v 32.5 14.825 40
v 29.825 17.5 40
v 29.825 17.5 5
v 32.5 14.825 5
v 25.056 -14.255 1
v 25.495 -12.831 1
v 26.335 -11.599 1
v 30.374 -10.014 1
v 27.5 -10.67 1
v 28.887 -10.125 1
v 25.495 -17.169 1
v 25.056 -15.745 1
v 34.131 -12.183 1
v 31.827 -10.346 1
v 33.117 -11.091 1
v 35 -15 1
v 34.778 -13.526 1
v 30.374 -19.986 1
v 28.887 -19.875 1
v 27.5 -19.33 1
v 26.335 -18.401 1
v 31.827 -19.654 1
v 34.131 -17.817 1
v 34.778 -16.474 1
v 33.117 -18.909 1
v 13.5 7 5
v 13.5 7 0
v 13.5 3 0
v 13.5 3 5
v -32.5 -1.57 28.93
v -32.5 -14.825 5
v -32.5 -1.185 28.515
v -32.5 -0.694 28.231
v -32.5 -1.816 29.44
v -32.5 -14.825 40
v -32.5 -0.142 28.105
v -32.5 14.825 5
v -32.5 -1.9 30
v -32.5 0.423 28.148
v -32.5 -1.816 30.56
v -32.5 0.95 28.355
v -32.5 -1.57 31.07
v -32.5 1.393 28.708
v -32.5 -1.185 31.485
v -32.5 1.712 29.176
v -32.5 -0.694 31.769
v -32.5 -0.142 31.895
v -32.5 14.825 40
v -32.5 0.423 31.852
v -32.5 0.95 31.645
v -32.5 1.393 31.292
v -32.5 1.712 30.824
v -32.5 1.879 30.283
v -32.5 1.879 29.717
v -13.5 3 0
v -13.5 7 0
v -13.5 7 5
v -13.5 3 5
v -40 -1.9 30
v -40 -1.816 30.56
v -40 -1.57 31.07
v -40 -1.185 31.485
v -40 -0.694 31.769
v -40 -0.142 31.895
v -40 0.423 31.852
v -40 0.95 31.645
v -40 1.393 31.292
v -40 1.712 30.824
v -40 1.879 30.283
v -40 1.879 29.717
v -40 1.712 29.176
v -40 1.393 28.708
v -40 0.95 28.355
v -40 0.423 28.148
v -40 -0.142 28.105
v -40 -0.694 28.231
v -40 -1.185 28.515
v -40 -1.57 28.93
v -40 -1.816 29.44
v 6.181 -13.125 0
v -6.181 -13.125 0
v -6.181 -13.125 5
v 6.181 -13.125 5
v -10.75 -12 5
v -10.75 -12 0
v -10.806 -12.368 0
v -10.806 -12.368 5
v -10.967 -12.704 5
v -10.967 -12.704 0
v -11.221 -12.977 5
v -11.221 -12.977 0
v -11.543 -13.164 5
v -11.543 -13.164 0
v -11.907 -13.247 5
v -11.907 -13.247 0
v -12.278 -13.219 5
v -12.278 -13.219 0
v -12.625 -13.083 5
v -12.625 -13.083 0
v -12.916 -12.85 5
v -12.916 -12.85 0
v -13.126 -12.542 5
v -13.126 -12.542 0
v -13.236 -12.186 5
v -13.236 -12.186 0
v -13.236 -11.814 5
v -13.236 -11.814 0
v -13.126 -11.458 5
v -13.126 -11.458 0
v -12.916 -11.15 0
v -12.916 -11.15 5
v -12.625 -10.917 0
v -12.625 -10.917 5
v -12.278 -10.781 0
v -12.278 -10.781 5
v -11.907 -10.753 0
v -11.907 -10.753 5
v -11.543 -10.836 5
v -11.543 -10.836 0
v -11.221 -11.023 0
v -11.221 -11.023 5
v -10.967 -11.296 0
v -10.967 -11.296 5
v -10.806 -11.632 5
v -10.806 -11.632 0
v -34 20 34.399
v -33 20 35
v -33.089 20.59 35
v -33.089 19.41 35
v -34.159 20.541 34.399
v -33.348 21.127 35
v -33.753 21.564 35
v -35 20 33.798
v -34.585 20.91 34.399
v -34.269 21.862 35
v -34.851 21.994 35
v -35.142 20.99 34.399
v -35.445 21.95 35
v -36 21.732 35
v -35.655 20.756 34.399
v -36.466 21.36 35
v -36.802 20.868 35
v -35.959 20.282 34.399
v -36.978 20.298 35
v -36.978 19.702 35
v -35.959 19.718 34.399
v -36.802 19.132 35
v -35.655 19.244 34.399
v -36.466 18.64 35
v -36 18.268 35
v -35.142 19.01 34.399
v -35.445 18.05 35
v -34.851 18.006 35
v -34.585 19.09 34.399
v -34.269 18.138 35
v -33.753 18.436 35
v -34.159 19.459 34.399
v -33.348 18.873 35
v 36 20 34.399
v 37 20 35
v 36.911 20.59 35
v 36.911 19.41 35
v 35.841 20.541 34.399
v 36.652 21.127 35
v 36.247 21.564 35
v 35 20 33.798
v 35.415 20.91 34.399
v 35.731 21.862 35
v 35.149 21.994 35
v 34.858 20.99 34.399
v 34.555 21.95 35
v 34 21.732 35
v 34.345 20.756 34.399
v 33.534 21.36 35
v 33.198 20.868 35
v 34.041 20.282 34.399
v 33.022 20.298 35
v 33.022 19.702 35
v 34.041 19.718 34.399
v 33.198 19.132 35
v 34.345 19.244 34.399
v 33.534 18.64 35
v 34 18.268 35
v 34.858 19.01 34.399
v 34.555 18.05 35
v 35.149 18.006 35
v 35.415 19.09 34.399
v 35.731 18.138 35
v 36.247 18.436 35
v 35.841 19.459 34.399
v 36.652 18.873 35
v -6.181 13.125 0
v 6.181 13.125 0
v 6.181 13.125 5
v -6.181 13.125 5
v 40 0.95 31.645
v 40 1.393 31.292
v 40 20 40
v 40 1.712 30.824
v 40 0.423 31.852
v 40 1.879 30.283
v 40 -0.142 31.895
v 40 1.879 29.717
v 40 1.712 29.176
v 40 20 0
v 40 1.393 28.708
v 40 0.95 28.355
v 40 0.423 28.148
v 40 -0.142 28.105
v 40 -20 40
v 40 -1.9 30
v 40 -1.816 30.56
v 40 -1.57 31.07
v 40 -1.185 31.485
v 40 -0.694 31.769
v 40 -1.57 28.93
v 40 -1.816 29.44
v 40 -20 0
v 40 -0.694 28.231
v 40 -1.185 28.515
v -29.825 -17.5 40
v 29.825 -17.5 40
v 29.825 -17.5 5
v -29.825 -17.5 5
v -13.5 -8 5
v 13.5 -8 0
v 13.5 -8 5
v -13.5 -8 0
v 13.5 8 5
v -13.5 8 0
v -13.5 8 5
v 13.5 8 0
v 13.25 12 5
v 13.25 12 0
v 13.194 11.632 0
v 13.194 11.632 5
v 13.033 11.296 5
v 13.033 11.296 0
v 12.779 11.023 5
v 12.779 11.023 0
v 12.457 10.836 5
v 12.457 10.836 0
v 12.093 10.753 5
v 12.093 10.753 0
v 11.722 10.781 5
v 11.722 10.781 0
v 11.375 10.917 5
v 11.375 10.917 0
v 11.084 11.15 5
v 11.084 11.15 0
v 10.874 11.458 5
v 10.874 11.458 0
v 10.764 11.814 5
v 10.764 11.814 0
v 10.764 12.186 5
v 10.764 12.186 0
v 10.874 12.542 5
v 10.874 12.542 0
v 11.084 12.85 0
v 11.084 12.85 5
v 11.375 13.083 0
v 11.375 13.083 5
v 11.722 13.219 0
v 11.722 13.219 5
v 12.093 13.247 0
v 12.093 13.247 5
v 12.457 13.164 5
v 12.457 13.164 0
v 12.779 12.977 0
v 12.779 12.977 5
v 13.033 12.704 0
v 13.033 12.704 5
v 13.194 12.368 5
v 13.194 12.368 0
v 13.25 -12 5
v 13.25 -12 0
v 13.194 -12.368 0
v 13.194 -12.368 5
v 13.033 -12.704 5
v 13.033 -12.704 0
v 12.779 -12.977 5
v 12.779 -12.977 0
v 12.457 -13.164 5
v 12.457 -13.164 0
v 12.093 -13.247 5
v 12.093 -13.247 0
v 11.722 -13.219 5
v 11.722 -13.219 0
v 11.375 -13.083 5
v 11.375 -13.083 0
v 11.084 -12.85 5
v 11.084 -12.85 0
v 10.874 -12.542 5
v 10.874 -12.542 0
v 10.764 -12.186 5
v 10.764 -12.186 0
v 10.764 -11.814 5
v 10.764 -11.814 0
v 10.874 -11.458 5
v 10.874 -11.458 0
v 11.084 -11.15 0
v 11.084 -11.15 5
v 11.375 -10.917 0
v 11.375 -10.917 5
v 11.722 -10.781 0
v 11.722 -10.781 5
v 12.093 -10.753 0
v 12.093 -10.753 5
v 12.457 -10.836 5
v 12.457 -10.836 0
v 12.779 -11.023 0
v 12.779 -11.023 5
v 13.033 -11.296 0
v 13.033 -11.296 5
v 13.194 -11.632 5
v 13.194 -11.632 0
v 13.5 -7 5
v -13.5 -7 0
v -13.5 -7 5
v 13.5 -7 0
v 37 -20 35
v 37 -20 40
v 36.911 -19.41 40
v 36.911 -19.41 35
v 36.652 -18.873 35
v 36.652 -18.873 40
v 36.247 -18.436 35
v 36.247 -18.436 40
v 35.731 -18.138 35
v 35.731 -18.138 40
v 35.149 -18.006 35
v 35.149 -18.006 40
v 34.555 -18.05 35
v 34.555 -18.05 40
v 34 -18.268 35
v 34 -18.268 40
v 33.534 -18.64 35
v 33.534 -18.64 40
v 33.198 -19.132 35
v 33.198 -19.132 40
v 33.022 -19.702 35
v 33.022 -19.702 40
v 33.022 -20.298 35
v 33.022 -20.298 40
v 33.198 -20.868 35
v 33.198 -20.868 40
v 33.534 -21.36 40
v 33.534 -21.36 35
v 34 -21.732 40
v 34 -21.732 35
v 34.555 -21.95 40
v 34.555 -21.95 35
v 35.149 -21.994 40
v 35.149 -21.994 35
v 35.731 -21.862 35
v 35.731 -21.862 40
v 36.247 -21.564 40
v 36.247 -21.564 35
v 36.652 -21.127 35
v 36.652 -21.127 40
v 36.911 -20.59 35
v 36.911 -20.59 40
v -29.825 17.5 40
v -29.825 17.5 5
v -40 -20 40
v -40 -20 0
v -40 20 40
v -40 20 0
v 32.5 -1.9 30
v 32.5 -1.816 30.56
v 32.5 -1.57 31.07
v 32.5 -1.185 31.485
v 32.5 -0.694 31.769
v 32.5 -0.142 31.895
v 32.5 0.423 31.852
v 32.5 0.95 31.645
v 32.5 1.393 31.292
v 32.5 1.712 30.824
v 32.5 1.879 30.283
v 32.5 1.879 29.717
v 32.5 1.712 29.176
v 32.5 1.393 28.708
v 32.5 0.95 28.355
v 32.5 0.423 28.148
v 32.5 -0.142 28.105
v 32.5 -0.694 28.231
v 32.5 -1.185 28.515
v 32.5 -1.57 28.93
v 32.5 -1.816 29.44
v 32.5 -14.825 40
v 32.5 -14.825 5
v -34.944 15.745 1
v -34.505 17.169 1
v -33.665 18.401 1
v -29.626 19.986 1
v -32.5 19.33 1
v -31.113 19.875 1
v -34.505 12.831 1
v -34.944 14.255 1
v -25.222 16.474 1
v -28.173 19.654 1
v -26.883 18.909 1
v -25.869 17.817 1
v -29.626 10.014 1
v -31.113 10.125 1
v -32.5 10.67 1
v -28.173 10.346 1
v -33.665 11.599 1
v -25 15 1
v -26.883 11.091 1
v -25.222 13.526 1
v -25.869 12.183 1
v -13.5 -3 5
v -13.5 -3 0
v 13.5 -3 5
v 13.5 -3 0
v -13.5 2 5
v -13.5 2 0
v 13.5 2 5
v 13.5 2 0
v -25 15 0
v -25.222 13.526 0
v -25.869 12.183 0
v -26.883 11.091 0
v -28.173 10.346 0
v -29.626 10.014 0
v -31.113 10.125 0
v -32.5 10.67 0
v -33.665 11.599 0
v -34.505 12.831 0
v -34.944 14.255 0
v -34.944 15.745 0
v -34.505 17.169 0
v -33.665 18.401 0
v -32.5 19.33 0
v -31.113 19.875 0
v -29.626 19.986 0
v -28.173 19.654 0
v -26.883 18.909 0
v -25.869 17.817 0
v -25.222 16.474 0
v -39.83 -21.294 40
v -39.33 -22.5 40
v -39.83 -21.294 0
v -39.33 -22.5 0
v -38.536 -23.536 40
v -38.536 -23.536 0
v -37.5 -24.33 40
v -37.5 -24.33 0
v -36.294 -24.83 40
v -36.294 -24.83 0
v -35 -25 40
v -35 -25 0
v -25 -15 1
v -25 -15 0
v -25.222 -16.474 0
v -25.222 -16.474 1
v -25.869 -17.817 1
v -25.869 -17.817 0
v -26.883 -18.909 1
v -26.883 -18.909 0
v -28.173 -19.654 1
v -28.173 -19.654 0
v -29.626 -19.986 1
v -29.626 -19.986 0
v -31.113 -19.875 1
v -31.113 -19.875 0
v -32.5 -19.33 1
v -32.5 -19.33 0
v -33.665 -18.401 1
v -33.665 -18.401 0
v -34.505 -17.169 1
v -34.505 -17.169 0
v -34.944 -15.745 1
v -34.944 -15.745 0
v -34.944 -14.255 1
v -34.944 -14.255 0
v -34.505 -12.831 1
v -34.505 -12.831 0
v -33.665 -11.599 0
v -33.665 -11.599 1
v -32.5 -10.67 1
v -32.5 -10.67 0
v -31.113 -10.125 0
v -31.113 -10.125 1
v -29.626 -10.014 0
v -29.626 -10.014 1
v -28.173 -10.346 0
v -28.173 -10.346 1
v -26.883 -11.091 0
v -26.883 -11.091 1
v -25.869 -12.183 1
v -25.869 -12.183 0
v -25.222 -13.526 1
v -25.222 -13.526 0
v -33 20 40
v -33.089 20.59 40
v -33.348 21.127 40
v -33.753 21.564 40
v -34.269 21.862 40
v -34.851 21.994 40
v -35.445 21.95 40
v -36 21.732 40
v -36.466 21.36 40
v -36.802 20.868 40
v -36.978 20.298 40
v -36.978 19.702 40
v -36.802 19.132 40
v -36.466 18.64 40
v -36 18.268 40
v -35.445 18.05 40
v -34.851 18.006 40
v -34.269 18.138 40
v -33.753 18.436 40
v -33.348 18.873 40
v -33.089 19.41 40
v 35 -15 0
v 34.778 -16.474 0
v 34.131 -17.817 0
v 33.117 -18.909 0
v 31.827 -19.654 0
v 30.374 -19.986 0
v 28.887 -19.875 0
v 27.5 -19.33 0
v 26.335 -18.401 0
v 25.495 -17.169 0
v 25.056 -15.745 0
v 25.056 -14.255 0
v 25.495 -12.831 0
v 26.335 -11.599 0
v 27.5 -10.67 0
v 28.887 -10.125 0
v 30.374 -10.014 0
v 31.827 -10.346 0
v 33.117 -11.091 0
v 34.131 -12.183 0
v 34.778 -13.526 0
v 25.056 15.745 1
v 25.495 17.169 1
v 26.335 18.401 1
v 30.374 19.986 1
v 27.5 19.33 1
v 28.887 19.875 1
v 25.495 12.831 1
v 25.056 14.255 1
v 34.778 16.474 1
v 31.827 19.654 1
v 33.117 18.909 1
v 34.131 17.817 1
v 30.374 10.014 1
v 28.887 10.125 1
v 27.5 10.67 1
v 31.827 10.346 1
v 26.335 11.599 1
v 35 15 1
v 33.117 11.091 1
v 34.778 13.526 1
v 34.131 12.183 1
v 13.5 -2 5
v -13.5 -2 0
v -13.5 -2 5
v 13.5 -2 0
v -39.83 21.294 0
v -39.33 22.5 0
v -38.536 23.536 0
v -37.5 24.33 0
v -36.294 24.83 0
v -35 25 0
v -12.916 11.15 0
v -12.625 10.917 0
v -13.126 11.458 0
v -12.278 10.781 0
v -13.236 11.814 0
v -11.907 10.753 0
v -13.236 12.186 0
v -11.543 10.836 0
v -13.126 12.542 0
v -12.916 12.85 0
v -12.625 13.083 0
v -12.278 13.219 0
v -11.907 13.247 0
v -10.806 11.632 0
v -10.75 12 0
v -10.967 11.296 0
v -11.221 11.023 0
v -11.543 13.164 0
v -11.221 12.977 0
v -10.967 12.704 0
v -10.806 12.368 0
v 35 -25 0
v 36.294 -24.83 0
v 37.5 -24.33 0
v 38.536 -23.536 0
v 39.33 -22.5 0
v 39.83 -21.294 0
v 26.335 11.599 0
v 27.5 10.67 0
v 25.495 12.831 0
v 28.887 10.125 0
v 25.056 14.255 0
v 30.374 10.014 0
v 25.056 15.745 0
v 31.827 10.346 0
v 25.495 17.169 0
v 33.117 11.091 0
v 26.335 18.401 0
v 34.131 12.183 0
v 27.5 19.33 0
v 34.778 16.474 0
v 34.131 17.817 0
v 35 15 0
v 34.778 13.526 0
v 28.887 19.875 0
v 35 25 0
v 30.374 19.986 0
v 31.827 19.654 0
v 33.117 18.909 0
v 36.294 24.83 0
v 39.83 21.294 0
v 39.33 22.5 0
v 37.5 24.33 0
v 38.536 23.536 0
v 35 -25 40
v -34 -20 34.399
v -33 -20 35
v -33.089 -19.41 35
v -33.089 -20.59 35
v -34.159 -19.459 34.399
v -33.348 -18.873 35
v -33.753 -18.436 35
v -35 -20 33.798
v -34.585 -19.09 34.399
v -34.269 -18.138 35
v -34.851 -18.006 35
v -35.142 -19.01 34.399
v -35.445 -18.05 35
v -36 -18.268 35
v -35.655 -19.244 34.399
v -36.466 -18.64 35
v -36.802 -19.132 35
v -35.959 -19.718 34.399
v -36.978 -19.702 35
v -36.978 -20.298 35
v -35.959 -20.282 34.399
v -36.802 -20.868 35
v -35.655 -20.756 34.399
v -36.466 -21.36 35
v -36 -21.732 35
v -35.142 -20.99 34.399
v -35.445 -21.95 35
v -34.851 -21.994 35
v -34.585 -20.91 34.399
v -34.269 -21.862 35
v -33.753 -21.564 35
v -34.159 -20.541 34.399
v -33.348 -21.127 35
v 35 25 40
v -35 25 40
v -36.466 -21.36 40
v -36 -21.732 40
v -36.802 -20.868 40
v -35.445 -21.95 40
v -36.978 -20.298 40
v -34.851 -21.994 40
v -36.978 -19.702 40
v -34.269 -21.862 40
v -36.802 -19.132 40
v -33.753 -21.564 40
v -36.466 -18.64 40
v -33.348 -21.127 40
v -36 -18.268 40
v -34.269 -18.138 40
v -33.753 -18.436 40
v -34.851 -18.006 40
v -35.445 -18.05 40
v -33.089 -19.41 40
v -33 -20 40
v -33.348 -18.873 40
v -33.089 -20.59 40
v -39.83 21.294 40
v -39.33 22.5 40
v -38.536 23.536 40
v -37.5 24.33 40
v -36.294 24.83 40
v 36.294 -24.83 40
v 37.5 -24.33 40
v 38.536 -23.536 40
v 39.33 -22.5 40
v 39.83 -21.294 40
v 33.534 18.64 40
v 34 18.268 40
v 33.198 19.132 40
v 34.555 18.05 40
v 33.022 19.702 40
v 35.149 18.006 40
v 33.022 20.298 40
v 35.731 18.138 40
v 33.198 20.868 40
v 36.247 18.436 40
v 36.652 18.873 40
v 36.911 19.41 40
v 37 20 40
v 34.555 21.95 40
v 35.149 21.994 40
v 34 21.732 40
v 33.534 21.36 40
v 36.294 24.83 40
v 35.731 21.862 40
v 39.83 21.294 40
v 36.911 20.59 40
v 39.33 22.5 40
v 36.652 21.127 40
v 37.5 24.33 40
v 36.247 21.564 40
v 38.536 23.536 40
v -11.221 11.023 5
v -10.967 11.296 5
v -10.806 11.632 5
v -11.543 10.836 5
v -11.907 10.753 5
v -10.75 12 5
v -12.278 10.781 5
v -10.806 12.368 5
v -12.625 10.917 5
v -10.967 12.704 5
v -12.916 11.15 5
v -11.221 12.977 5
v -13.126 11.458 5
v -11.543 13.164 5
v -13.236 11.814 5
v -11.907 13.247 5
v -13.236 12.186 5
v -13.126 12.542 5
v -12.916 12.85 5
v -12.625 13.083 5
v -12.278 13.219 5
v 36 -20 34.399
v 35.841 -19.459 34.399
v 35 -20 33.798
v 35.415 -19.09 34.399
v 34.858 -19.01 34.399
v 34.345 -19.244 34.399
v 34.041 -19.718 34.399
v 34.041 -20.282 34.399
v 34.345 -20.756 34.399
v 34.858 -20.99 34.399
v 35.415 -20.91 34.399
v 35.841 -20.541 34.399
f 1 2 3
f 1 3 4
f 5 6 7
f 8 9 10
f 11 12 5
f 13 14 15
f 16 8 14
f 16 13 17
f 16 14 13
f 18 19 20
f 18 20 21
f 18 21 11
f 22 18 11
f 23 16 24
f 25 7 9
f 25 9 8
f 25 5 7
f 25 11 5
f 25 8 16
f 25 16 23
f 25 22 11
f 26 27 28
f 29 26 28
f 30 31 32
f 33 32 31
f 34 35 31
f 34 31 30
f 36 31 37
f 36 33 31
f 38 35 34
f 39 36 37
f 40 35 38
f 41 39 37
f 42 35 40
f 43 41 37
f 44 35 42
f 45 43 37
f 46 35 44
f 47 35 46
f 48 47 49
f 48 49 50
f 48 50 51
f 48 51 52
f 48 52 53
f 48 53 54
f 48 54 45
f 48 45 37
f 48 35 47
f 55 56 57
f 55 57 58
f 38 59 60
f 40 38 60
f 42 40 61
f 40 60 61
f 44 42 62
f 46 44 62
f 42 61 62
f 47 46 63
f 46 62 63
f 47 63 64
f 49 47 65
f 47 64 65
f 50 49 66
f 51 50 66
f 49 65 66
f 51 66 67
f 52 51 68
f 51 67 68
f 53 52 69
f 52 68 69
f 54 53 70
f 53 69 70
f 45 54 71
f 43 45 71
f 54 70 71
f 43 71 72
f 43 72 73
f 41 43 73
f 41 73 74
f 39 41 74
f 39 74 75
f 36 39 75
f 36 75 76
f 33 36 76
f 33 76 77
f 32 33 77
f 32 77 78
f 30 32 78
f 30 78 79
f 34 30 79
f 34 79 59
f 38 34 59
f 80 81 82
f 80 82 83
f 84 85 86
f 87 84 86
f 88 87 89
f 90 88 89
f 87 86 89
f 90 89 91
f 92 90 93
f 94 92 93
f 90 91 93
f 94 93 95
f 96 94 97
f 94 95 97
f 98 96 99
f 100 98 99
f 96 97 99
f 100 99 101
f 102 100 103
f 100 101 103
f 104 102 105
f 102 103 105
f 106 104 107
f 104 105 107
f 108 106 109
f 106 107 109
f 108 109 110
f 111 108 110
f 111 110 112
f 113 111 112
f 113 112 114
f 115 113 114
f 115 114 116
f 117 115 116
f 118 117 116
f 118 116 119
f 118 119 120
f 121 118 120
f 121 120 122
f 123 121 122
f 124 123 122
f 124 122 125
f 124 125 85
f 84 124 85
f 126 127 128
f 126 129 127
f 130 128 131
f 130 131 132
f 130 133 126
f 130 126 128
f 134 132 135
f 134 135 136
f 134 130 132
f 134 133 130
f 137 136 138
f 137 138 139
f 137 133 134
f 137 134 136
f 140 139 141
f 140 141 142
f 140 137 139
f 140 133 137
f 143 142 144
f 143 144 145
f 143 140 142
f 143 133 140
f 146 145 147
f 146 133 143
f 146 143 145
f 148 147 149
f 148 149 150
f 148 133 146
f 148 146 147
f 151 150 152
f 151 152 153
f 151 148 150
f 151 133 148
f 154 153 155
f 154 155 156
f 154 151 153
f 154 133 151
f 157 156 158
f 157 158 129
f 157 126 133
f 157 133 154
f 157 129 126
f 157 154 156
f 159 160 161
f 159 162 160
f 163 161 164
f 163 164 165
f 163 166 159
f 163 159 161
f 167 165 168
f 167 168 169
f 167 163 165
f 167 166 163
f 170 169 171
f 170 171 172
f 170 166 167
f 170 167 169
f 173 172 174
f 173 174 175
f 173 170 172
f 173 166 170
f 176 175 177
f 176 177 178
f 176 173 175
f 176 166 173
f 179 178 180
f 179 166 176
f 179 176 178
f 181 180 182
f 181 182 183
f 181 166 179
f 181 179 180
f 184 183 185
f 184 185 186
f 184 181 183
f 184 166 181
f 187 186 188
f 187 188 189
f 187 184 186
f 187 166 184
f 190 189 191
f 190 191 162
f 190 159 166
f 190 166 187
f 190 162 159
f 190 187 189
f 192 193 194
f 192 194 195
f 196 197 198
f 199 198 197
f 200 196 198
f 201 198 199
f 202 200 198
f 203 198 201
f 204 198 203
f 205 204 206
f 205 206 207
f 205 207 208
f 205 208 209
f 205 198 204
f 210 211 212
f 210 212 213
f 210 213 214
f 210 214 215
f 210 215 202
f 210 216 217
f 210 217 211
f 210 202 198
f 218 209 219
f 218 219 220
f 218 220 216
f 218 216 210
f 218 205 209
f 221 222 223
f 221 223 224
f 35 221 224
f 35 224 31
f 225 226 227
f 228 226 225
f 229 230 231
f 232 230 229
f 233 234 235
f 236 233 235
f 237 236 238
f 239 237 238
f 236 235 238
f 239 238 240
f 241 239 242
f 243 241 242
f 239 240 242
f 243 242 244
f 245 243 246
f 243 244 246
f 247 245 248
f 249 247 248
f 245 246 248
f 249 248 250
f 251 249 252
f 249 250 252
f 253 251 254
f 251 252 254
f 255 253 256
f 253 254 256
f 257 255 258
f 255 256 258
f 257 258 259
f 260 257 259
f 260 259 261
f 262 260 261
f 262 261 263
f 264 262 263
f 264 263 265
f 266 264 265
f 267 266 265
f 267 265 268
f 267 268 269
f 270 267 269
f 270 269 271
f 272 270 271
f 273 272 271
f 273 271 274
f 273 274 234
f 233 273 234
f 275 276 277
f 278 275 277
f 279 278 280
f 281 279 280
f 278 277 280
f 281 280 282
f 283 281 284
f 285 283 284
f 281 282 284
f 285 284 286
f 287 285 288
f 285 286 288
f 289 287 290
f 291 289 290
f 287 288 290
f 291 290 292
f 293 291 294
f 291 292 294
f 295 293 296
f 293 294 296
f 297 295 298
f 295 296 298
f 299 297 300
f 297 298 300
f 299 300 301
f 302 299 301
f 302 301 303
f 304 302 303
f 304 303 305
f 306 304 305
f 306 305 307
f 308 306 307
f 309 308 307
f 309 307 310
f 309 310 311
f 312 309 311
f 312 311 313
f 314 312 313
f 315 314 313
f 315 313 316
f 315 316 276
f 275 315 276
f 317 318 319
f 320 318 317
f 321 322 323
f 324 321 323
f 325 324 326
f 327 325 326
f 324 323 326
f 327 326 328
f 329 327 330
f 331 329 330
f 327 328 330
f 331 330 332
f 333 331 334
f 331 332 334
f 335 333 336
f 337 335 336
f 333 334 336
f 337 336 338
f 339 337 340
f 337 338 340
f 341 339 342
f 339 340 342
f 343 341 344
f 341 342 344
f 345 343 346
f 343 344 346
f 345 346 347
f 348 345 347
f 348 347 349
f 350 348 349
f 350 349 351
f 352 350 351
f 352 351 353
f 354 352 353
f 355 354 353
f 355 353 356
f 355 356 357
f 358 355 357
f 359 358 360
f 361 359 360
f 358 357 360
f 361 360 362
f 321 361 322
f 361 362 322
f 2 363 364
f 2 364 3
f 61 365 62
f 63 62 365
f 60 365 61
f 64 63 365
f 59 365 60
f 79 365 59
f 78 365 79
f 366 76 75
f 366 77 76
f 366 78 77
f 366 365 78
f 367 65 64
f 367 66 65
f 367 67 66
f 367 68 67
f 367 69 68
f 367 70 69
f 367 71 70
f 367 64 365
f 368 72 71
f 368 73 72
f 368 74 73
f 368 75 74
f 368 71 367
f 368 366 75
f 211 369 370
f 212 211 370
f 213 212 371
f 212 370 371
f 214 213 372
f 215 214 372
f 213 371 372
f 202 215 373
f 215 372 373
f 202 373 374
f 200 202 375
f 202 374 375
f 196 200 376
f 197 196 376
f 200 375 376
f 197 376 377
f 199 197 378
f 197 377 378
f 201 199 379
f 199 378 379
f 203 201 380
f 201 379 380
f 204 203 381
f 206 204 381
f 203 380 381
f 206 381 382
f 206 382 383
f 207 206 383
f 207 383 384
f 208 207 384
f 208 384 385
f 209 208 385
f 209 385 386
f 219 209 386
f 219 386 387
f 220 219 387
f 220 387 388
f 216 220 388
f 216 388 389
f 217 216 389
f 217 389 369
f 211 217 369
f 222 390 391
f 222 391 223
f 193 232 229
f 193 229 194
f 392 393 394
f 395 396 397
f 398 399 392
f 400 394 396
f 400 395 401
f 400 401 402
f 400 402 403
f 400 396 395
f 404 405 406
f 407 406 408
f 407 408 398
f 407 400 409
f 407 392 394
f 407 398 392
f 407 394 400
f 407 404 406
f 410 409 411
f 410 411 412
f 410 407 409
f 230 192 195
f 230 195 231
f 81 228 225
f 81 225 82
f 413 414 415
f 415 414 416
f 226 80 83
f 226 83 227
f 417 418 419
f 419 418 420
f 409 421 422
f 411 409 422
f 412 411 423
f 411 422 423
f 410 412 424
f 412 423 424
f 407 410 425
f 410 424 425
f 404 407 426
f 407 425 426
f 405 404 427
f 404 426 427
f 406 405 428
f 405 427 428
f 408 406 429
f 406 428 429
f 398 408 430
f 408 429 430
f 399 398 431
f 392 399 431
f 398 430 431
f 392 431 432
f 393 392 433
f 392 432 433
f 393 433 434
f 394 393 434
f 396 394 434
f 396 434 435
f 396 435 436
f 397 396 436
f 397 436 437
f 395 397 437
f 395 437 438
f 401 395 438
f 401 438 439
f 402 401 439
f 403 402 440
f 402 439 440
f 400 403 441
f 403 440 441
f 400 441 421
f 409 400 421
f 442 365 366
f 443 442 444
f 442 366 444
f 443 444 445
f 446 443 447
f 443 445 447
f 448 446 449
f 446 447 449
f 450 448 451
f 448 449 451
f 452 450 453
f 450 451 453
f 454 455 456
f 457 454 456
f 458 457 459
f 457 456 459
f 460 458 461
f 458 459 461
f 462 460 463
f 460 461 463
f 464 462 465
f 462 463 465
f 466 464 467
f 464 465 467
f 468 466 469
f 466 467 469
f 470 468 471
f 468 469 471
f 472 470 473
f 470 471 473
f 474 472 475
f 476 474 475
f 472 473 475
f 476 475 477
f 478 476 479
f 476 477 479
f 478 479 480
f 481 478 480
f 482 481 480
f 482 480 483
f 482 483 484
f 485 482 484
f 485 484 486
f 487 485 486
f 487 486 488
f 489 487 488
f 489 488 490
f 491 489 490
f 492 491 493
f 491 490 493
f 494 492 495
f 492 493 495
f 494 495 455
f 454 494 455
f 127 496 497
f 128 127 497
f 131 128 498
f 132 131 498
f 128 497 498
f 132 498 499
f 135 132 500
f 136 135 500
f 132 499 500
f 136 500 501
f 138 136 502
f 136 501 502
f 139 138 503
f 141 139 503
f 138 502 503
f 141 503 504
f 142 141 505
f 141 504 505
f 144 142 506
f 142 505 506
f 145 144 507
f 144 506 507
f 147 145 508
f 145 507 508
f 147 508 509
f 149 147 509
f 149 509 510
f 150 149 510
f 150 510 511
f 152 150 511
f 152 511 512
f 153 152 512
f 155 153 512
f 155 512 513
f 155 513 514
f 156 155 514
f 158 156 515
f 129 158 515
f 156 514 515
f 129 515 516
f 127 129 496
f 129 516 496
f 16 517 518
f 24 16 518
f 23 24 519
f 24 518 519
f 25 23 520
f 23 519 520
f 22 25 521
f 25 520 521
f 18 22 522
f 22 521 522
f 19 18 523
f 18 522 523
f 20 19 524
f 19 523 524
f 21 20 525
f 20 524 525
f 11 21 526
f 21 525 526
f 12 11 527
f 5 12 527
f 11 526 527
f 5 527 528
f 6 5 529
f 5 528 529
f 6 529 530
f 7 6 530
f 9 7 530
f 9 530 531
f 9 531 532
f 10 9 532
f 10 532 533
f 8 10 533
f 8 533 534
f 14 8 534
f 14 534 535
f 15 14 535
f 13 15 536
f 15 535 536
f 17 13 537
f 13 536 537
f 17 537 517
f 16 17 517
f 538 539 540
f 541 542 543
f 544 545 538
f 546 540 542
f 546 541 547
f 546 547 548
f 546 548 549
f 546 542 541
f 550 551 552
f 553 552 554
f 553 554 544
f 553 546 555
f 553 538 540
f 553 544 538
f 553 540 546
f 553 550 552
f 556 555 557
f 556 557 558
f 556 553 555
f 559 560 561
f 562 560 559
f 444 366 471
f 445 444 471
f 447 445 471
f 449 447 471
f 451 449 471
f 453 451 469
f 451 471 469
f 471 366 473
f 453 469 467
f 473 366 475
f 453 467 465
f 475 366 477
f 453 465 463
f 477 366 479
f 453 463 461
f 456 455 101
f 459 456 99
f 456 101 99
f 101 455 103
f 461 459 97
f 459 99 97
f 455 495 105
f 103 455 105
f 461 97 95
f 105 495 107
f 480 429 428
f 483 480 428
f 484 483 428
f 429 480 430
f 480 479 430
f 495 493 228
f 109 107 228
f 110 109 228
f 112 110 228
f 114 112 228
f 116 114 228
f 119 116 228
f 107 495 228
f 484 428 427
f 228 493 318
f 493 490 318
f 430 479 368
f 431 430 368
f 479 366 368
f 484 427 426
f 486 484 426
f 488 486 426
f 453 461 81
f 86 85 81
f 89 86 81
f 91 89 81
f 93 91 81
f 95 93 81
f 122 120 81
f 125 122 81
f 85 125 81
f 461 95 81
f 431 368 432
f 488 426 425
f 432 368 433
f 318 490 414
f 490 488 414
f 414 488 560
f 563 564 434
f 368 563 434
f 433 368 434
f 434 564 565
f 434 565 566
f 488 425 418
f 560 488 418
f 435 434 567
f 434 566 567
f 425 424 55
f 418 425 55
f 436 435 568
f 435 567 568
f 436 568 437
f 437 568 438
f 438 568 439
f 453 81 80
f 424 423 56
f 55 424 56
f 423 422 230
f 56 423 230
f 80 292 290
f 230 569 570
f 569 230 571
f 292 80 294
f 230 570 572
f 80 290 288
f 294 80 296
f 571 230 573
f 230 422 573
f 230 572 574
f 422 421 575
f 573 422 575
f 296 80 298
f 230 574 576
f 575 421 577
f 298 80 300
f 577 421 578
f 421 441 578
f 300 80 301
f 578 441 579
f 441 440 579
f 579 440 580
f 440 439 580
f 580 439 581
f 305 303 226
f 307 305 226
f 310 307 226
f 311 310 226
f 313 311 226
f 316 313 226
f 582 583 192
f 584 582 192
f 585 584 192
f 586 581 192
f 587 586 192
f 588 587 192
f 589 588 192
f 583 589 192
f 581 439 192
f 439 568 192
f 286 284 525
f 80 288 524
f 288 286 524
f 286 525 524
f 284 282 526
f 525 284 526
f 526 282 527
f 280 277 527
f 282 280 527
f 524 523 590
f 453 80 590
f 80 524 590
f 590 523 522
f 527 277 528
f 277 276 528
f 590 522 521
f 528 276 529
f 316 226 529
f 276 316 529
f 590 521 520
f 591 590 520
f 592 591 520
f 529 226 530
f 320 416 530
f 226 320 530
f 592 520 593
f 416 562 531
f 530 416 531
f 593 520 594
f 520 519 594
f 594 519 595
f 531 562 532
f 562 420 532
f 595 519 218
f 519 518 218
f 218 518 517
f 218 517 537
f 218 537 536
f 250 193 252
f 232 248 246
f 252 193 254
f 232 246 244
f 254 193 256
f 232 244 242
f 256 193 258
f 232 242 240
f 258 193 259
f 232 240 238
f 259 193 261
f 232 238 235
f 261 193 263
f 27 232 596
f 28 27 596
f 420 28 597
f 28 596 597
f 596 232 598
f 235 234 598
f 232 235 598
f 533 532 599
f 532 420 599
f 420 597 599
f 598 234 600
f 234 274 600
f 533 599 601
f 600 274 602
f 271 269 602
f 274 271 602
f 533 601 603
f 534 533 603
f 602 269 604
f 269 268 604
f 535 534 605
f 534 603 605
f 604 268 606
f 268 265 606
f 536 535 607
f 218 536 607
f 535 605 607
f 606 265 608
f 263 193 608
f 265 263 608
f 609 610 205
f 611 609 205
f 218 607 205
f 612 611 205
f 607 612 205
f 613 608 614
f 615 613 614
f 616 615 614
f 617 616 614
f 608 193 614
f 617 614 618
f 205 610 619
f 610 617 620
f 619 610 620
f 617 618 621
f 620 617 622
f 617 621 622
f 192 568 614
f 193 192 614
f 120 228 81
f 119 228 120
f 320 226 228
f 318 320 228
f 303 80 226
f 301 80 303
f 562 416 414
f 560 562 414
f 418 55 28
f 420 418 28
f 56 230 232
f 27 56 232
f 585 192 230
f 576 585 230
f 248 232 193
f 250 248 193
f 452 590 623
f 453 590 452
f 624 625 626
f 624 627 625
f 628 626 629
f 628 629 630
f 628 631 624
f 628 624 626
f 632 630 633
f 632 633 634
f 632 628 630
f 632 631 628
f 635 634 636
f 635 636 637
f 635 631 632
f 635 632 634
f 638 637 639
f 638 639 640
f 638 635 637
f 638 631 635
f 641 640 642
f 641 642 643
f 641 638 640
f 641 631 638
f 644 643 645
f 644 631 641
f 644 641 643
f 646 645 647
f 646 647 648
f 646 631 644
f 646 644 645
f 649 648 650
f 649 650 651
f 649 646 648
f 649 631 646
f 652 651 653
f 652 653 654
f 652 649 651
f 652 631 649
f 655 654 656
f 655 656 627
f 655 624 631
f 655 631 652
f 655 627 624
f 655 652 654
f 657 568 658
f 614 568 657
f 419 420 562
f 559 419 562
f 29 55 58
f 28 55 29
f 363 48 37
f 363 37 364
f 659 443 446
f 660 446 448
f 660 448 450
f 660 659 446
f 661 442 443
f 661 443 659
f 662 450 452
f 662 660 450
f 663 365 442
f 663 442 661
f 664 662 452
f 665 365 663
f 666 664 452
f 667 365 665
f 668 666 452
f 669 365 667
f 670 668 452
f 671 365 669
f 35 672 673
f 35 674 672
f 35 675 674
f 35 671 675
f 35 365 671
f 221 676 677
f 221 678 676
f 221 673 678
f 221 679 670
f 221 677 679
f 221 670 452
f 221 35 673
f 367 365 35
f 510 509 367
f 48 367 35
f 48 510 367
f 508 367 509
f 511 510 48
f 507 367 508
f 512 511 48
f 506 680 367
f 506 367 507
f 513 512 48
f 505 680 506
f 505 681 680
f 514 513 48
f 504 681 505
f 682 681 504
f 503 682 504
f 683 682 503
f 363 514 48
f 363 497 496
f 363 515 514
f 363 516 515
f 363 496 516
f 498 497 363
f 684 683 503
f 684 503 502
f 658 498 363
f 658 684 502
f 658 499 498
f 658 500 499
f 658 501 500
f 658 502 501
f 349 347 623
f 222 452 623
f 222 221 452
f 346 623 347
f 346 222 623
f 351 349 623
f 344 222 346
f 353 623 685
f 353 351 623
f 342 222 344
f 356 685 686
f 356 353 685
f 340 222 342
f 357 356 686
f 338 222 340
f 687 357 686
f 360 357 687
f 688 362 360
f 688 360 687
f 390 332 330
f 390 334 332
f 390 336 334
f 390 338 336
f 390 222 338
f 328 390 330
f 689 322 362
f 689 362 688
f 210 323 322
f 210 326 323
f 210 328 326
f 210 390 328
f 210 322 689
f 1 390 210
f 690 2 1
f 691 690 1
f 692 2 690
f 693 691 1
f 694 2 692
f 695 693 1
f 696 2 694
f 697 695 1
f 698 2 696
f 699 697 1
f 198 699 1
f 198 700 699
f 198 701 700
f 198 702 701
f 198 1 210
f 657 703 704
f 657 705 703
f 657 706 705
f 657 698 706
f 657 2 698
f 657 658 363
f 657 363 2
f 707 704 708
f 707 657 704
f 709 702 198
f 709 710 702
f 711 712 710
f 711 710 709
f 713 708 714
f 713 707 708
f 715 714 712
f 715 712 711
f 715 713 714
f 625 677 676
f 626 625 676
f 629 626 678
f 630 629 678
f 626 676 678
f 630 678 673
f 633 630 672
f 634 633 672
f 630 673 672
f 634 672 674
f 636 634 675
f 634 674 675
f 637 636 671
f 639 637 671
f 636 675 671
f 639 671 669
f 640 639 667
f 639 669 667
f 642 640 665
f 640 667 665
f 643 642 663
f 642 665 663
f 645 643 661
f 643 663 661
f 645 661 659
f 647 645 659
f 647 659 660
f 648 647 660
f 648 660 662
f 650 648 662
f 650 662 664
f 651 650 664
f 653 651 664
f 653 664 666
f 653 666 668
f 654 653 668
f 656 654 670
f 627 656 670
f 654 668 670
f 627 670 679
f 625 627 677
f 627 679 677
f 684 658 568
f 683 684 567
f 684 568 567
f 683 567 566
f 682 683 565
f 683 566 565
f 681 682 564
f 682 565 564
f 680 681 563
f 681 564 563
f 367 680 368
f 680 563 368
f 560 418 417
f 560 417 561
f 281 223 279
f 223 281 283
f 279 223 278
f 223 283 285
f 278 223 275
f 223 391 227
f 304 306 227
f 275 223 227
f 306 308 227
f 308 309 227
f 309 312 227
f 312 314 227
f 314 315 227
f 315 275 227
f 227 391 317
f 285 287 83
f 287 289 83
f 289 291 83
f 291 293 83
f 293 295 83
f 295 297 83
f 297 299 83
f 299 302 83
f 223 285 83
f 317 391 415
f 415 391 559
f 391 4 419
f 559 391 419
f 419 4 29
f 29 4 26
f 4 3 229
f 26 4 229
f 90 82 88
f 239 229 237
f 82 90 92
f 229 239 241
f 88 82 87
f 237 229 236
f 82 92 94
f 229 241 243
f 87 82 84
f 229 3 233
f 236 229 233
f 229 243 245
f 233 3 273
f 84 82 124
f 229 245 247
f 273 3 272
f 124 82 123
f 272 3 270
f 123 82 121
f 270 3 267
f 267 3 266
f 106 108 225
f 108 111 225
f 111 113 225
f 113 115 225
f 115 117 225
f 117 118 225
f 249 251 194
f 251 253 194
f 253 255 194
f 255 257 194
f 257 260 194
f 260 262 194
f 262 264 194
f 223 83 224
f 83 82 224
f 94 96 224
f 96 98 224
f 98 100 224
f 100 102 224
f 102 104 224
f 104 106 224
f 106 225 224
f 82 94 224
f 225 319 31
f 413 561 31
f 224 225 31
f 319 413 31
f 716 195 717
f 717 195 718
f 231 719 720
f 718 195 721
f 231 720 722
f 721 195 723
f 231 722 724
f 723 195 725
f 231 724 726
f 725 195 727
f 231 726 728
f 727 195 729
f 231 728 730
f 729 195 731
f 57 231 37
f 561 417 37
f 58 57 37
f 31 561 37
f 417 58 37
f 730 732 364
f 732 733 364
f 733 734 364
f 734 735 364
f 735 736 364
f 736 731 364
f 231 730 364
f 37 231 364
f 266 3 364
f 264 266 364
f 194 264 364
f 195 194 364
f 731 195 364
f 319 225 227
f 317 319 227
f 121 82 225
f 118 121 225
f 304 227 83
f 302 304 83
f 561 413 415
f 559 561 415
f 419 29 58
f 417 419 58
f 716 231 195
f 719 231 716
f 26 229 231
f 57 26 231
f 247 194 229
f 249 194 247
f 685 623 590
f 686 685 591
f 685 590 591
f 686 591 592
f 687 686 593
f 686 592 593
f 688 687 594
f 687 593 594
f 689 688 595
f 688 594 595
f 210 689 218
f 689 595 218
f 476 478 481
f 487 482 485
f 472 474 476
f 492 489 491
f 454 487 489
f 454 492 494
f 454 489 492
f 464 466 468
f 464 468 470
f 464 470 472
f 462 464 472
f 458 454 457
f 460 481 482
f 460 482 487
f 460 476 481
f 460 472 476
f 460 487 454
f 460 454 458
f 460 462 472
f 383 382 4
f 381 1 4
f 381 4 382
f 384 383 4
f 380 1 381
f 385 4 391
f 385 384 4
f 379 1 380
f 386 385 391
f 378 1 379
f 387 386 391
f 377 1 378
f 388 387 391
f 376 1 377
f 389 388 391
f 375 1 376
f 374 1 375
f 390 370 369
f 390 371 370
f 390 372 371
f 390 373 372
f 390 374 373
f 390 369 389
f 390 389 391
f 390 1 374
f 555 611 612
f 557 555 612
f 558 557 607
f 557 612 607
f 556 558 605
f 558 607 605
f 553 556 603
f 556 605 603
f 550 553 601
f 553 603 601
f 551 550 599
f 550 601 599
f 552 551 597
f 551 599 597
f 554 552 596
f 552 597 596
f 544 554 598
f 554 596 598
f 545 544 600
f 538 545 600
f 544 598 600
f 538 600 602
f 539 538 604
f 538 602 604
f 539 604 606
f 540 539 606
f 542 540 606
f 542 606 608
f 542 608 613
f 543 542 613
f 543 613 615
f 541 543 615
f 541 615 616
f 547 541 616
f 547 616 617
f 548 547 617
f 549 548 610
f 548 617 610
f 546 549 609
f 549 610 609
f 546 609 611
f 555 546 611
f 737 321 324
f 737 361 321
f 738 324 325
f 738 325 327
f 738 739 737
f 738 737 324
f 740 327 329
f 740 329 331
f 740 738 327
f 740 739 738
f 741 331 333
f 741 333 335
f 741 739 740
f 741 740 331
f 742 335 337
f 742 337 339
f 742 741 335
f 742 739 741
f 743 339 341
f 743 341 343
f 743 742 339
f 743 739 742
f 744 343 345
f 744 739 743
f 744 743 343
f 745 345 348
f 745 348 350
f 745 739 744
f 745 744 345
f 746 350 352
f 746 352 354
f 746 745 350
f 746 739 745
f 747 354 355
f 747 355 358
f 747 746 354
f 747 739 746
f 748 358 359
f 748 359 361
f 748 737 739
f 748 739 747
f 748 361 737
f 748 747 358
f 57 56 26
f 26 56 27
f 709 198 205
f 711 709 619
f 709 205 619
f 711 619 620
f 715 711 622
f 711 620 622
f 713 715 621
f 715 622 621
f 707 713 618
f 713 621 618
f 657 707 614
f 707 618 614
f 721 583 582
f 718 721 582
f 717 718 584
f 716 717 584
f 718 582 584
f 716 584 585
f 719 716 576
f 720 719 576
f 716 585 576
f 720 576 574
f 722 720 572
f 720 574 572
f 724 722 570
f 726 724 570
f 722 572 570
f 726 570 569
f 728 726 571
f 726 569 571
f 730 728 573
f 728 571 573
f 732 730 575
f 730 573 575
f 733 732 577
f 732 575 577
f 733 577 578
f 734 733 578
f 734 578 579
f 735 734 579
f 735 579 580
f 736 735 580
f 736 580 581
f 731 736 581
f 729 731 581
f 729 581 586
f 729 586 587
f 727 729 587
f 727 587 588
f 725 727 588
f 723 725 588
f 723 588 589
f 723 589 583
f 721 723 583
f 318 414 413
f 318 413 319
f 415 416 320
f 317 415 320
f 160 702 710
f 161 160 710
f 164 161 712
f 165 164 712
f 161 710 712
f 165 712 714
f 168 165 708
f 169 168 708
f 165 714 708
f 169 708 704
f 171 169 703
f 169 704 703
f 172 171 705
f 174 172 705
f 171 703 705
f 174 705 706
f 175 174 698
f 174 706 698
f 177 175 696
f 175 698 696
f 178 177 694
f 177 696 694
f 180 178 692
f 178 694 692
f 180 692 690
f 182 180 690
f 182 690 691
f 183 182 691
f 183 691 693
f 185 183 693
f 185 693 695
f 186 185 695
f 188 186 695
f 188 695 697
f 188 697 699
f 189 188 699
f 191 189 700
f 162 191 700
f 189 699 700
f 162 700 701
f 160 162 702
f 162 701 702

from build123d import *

# Parameters (mm, degrees)
PAD_DEPTH       = 40
POCKET_DEPTH    = 35
SKETCH002_R     = 1.25
SKETCH002_W     = 27
SKETCH002_H     = 4
POCKET001_DEPTH = 10
SKETCH003_R     = 2
HOLE_DEPTH      = 5
HOLE_TIPS_R     = 2
SKETCH004_R     = 5
POCKET002_DEPTH = 1
SKETCH009_R     = 1.9
POCKET005_DEPTH = 100


with BuildPart() as part:
    # Sketch → Pad (new body)
    with BuildSketch(Plane.XY):
        with BuildLine():
            ThreePointArc((-35, 25), (-38.535534, 23.535534), (-40, 20))
            Line((-40, -20), (-40, 20))
            ThreePointArc((-40, -20), (-38.535534, -23.535534), (-35, -25))
            Line((35, -25), (-35, -25))
            ThreePointArc((35, -25), (38.535534, -23.535534), (40, -20))
            Line((40, 20), (40, -20))
            ThreePointArc((40, 20), (38.535534, 23.535534), (35, 25))
            Line((-35, 25), (35, 25))
        make_face()
    extrude(amount=PAD_DEPTH)

    # Sketch001 (on Face10 of Pad) → Pocket (cut)
    with BuildSketch(Plane.XY.offset(40)):
        Polygon((-32.5, 14.82538), (-29.82538, 17.5), (29.82538, 17.5), (32.5, 14.82538), (32.5, -14.82538), (29.82538, -17.5), (-29.82538, -17.5), (-32.5, -14.82538), align=None)
    extrude(amount=-POCKET_DEPTH, mode=Mode.SUBTRACT)

    # Sketch002 (on Face4 of Pocket) → Pocket001 (cut)
    with BuildSketch(Plane(origin=(0, 0, 0), x_dir=(1, 0, 0), z_dir=(0, 0, -1))):
        with Locations((-12, 12)):
            Circle(SKETCH002_R)
        with Locations((12, 12)):
            Circle(SKETCH002_R)
        with Locations((-12, -12)):
            Circle(SKETCH002_R)
        with Locations((12, -12)):
            Circle(SKETCH002_R)
        Rectangle(SKETCH002_W, SKETCH002_H)
        with Locations((0, 5)):
            Rectangle(SKETCH002_W, SKETCH002_H)
        with Locations((0, -5)):
            Rectangle(SKETCH002_W, SKETCH002_H)
        Polygon((-13.5, 8), (-6.180741, 13.125), (6.180741, 13.125), (13.5, 8), align=None)
        Polygon((-13.5, -8), (13.5, -8), (6.180741, -13.125), (-6.180741, -13.125), align=None)
    extrude(amount=-POCKET001_DEPTH, mode=Mode.SUBTRACT)

    # Sketch003 (on Face5 of Pocket001) → Hole (cut)
    with BuildSketch(Plane.XY.offset(40)):
        with Locations((-35, 20)):
            Circle(SKETCH003_R)
        with Locations((35, 20)):
            Circle(SKETCH003_R)
        with Locations((35, -20)):
            Circle(SKETCH003_R)
        with Locations((-35, -20)):
            Circle(SKETCH003_R)
    extrude(amount=-HOLE_DEPTH, mode=Mode.SUBTRACT)

    # Hole tips → Hole tip 1 section 0
    with BuildSketch(Plane.XY.offset(35), mode=Mode.PRIVATE) as hole_tip_1_s0:
        with Locations((-35, 20)):
            Circle(HOLE_TIPS_R)
    loft([hole_tip_1_s0.sketch, Vertex(-35, 20, 33.798279)], mode=Mode.SUBTRACT)

    # Hole tips → Hole tip 2 section 0
    with BuildSketch(Plane.XY.offset(35), mode=Mode.PRIVATE) as hole_tip_2_s0:
        with Locations((35, 20)):
            Circle(HOLE_TIPS_R)
    loft([hole_tip_2_s0.sketch, Vertex(35, 20, 33.798279)], mode=Mode.SUBTRACT)

    # Hole tips → Hole tip 3 section 0
    with BuildSketch(Plane.XY.offset(35), mode=Mode.PRIVATE) as hole_tip_3_s0:
        with Locations((35, -20)):
            Circle(HOLE_TIPS_R)
    loft([hole_tip_3_s0.sketch, Vertex(35, -20, 33.798279)], mode=Mode.SUBTRACT)

    # Hole tips → Hole tip 4 section 0
    with BuildSketch(Plane.XY.offset(35), mode=Mode.PRIVATE) as hole_tip_4_s0:
        with Locations((-35, -20)):
            Circle(HOLE_TIPS_R)
    loft([hole_tip_4_s0.sketch, Vertex(-35, -20, 33.798279)], mode=Mode.SUBTRACT)

    # Sketch004 (on Face4 of Hole) → Pocket002 (cut)
    with BuildSketch(Plane(origin=(0, 0, 0), x_dir=(1, 0, 0), z_dir=(0, 0, -1))):
        with Locations((-30, 15)):
            Circle(SKETCH004_R)
        with Locations((-30, -15)):
            Circle(SKETCH004_R)
        with Locations((30, 15)):
            Circle(SKETCH004_R)
        with Locations((30, -15)):
            Circle(SKETCH004_R)
    extrude(amount=-POCKET002_DEPTH, mode=Mode.SUBTRACT)

    # Sketch009 (on Face9 of Hole) → Pocket005 (cut)
    with BuildSketch(Plane(origin=(-40, 0, 0), x_dir=(0, -1, 0), z_dir=(-1, 0, 0))):
        with Locations((0, 30)):
            Circle(SKETCH009_R)
    extrude(amount=-POCKET005_DEPTH, mode=Mode.SUBTRACT)


solid = part.part
